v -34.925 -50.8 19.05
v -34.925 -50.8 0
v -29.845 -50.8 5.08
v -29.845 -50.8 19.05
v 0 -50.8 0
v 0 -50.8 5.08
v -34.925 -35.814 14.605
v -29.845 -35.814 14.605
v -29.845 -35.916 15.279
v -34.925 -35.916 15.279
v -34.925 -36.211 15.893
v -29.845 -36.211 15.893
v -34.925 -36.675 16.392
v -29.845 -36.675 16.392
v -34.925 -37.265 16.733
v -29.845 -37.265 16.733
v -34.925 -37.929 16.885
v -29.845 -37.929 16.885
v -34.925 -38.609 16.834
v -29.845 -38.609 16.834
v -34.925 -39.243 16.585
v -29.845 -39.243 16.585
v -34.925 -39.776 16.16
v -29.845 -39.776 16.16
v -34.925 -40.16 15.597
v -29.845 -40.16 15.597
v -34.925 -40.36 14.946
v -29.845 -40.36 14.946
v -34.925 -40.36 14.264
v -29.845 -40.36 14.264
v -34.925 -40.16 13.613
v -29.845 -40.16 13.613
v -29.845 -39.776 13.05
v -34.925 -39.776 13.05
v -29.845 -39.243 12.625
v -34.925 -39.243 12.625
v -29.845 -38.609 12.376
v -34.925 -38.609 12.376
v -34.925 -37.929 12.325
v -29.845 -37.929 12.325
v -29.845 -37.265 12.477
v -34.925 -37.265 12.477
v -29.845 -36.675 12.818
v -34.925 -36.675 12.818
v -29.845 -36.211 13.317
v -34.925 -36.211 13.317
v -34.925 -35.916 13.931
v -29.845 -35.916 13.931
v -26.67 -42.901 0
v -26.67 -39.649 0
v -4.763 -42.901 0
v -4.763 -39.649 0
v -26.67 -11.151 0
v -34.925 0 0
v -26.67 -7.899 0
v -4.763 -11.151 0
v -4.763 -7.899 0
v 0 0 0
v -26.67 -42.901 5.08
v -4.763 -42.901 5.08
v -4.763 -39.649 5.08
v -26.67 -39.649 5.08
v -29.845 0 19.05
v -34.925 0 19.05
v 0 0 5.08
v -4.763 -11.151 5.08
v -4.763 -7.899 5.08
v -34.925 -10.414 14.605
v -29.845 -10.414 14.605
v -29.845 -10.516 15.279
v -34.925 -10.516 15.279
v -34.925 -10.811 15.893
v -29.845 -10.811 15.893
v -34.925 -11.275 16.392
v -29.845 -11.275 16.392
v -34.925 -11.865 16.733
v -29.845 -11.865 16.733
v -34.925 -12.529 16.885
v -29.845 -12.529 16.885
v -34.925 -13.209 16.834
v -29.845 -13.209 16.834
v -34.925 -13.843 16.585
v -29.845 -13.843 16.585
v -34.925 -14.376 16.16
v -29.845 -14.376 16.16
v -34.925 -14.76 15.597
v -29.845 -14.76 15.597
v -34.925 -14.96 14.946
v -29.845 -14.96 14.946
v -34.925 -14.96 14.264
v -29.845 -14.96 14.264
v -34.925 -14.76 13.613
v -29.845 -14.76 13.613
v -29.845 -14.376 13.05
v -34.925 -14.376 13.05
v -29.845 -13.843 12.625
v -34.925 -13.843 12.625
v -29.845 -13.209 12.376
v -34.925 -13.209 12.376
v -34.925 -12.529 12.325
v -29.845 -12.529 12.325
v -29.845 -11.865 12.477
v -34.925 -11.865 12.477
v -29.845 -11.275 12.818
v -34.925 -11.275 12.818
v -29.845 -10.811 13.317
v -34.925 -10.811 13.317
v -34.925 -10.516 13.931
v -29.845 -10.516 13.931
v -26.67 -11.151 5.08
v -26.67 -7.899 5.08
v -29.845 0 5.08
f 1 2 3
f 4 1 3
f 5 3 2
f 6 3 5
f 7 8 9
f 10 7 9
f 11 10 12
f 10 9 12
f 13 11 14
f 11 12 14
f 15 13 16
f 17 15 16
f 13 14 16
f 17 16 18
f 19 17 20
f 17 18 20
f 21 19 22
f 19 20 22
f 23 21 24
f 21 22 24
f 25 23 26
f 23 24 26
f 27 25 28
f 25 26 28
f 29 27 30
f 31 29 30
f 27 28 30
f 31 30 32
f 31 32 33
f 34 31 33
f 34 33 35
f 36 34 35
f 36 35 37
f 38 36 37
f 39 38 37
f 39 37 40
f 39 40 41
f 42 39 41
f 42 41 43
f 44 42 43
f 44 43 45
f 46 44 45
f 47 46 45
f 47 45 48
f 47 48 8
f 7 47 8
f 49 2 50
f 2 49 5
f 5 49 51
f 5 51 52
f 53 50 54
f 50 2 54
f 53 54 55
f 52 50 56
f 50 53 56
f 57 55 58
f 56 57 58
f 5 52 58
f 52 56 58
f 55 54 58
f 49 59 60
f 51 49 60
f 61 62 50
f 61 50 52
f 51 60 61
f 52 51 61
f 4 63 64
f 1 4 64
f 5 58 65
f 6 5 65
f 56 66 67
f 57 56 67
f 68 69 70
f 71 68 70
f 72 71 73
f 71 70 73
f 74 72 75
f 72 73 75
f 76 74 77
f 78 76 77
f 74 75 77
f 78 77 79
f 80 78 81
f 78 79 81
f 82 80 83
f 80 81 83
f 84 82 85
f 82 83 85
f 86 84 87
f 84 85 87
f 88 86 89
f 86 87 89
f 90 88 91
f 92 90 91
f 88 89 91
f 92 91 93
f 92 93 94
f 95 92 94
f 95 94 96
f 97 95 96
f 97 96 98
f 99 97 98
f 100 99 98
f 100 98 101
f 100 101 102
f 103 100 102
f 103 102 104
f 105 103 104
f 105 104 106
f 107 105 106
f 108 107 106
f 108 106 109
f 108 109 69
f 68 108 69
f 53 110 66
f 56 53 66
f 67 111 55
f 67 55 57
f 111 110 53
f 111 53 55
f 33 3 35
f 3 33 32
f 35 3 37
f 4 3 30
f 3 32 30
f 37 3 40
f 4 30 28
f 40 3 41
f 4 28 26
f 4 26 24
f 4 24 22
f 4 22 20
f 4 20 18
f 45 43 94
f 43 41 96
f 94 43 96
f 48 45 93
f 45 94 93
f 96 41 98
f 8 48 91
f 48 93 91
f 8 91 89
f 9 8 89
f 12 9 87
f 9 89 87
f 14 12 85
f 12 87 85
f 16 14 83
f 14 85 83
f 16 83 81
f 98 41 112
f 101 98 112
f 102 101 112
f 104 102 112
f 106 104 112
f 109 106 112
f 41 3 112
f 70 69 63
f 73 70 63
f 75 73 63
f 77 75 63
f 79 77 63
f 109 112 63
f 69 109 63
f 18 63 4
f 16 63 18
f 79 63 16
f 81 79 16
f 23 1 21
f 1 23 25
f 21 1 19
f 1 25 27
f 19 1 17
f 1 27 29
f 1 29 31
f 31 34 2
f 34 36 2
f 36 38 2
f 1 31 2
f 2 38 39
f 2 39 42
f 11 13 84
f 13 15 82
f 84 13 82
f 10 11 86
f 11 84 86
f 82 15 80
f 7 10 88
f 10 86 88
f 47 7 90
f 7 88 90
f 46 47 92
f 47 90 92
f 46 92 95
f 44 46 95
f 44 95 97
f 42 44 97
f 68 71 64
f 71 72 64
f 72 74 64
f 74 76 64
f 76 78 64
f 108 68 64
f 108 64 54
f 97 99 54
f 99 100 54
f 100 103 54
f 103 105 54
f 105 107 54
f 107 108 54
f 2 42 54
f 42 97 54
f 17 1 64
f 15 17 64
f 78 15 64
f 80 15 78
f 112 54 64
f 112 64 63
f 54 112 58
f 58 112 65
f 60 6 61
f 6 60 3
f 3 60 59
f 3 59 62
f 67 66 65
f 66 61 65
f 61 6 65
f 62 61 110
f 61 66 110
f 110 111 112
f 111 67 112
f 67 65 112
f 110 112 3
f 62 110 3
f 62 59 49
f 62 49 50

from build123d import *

# Parameters (mm, degrees)
F1_DEPTH = 50.8
F2_W     = 21.9075
F2_H     = 3.2512
F3_DEPTH = 25.4
F4_R     = 2.286
F5_DEPTH = 25.4


with BuildPart() as f1:
    # F0 (on Front) → F1 (new body)
    with BuildSketch(Plane.XZ):
        Polygon((-34.925, 0), (0, 0), (0, 5.08), (-29.845, 5.08), (-29.845, 19.05), (-34.925, 19.05), align=None)
    extrude(amount=F1_DEPTH)

    # F2 (on face) → F3 (cut)
    with BuildSketch(Plane.XY.offset(5.08)):
        with Locations((-15.71625, -41.275)):
            Rectangle(F2_W, F2_H)
        with Locations((-15.71625, -9.525)):
            Rectangle(F2_W, F2_H)
    extrude(amount=-F3_DEPTH, mode=Mode.SUBTRACT)

    # F4 (on face) → F5 (cut)
    with BuildSketch(Plane.YZ.offset(-29.845)):
        with Locations((-38.1, 14.605)):
            Circle(F4_R)
        with Locations((-12.7, 14.605)):
            Circle(F4_R)
    extrude(amount=-F5_DEPTH, mode=Mode.SUBTRACT)


solid = f1.part
